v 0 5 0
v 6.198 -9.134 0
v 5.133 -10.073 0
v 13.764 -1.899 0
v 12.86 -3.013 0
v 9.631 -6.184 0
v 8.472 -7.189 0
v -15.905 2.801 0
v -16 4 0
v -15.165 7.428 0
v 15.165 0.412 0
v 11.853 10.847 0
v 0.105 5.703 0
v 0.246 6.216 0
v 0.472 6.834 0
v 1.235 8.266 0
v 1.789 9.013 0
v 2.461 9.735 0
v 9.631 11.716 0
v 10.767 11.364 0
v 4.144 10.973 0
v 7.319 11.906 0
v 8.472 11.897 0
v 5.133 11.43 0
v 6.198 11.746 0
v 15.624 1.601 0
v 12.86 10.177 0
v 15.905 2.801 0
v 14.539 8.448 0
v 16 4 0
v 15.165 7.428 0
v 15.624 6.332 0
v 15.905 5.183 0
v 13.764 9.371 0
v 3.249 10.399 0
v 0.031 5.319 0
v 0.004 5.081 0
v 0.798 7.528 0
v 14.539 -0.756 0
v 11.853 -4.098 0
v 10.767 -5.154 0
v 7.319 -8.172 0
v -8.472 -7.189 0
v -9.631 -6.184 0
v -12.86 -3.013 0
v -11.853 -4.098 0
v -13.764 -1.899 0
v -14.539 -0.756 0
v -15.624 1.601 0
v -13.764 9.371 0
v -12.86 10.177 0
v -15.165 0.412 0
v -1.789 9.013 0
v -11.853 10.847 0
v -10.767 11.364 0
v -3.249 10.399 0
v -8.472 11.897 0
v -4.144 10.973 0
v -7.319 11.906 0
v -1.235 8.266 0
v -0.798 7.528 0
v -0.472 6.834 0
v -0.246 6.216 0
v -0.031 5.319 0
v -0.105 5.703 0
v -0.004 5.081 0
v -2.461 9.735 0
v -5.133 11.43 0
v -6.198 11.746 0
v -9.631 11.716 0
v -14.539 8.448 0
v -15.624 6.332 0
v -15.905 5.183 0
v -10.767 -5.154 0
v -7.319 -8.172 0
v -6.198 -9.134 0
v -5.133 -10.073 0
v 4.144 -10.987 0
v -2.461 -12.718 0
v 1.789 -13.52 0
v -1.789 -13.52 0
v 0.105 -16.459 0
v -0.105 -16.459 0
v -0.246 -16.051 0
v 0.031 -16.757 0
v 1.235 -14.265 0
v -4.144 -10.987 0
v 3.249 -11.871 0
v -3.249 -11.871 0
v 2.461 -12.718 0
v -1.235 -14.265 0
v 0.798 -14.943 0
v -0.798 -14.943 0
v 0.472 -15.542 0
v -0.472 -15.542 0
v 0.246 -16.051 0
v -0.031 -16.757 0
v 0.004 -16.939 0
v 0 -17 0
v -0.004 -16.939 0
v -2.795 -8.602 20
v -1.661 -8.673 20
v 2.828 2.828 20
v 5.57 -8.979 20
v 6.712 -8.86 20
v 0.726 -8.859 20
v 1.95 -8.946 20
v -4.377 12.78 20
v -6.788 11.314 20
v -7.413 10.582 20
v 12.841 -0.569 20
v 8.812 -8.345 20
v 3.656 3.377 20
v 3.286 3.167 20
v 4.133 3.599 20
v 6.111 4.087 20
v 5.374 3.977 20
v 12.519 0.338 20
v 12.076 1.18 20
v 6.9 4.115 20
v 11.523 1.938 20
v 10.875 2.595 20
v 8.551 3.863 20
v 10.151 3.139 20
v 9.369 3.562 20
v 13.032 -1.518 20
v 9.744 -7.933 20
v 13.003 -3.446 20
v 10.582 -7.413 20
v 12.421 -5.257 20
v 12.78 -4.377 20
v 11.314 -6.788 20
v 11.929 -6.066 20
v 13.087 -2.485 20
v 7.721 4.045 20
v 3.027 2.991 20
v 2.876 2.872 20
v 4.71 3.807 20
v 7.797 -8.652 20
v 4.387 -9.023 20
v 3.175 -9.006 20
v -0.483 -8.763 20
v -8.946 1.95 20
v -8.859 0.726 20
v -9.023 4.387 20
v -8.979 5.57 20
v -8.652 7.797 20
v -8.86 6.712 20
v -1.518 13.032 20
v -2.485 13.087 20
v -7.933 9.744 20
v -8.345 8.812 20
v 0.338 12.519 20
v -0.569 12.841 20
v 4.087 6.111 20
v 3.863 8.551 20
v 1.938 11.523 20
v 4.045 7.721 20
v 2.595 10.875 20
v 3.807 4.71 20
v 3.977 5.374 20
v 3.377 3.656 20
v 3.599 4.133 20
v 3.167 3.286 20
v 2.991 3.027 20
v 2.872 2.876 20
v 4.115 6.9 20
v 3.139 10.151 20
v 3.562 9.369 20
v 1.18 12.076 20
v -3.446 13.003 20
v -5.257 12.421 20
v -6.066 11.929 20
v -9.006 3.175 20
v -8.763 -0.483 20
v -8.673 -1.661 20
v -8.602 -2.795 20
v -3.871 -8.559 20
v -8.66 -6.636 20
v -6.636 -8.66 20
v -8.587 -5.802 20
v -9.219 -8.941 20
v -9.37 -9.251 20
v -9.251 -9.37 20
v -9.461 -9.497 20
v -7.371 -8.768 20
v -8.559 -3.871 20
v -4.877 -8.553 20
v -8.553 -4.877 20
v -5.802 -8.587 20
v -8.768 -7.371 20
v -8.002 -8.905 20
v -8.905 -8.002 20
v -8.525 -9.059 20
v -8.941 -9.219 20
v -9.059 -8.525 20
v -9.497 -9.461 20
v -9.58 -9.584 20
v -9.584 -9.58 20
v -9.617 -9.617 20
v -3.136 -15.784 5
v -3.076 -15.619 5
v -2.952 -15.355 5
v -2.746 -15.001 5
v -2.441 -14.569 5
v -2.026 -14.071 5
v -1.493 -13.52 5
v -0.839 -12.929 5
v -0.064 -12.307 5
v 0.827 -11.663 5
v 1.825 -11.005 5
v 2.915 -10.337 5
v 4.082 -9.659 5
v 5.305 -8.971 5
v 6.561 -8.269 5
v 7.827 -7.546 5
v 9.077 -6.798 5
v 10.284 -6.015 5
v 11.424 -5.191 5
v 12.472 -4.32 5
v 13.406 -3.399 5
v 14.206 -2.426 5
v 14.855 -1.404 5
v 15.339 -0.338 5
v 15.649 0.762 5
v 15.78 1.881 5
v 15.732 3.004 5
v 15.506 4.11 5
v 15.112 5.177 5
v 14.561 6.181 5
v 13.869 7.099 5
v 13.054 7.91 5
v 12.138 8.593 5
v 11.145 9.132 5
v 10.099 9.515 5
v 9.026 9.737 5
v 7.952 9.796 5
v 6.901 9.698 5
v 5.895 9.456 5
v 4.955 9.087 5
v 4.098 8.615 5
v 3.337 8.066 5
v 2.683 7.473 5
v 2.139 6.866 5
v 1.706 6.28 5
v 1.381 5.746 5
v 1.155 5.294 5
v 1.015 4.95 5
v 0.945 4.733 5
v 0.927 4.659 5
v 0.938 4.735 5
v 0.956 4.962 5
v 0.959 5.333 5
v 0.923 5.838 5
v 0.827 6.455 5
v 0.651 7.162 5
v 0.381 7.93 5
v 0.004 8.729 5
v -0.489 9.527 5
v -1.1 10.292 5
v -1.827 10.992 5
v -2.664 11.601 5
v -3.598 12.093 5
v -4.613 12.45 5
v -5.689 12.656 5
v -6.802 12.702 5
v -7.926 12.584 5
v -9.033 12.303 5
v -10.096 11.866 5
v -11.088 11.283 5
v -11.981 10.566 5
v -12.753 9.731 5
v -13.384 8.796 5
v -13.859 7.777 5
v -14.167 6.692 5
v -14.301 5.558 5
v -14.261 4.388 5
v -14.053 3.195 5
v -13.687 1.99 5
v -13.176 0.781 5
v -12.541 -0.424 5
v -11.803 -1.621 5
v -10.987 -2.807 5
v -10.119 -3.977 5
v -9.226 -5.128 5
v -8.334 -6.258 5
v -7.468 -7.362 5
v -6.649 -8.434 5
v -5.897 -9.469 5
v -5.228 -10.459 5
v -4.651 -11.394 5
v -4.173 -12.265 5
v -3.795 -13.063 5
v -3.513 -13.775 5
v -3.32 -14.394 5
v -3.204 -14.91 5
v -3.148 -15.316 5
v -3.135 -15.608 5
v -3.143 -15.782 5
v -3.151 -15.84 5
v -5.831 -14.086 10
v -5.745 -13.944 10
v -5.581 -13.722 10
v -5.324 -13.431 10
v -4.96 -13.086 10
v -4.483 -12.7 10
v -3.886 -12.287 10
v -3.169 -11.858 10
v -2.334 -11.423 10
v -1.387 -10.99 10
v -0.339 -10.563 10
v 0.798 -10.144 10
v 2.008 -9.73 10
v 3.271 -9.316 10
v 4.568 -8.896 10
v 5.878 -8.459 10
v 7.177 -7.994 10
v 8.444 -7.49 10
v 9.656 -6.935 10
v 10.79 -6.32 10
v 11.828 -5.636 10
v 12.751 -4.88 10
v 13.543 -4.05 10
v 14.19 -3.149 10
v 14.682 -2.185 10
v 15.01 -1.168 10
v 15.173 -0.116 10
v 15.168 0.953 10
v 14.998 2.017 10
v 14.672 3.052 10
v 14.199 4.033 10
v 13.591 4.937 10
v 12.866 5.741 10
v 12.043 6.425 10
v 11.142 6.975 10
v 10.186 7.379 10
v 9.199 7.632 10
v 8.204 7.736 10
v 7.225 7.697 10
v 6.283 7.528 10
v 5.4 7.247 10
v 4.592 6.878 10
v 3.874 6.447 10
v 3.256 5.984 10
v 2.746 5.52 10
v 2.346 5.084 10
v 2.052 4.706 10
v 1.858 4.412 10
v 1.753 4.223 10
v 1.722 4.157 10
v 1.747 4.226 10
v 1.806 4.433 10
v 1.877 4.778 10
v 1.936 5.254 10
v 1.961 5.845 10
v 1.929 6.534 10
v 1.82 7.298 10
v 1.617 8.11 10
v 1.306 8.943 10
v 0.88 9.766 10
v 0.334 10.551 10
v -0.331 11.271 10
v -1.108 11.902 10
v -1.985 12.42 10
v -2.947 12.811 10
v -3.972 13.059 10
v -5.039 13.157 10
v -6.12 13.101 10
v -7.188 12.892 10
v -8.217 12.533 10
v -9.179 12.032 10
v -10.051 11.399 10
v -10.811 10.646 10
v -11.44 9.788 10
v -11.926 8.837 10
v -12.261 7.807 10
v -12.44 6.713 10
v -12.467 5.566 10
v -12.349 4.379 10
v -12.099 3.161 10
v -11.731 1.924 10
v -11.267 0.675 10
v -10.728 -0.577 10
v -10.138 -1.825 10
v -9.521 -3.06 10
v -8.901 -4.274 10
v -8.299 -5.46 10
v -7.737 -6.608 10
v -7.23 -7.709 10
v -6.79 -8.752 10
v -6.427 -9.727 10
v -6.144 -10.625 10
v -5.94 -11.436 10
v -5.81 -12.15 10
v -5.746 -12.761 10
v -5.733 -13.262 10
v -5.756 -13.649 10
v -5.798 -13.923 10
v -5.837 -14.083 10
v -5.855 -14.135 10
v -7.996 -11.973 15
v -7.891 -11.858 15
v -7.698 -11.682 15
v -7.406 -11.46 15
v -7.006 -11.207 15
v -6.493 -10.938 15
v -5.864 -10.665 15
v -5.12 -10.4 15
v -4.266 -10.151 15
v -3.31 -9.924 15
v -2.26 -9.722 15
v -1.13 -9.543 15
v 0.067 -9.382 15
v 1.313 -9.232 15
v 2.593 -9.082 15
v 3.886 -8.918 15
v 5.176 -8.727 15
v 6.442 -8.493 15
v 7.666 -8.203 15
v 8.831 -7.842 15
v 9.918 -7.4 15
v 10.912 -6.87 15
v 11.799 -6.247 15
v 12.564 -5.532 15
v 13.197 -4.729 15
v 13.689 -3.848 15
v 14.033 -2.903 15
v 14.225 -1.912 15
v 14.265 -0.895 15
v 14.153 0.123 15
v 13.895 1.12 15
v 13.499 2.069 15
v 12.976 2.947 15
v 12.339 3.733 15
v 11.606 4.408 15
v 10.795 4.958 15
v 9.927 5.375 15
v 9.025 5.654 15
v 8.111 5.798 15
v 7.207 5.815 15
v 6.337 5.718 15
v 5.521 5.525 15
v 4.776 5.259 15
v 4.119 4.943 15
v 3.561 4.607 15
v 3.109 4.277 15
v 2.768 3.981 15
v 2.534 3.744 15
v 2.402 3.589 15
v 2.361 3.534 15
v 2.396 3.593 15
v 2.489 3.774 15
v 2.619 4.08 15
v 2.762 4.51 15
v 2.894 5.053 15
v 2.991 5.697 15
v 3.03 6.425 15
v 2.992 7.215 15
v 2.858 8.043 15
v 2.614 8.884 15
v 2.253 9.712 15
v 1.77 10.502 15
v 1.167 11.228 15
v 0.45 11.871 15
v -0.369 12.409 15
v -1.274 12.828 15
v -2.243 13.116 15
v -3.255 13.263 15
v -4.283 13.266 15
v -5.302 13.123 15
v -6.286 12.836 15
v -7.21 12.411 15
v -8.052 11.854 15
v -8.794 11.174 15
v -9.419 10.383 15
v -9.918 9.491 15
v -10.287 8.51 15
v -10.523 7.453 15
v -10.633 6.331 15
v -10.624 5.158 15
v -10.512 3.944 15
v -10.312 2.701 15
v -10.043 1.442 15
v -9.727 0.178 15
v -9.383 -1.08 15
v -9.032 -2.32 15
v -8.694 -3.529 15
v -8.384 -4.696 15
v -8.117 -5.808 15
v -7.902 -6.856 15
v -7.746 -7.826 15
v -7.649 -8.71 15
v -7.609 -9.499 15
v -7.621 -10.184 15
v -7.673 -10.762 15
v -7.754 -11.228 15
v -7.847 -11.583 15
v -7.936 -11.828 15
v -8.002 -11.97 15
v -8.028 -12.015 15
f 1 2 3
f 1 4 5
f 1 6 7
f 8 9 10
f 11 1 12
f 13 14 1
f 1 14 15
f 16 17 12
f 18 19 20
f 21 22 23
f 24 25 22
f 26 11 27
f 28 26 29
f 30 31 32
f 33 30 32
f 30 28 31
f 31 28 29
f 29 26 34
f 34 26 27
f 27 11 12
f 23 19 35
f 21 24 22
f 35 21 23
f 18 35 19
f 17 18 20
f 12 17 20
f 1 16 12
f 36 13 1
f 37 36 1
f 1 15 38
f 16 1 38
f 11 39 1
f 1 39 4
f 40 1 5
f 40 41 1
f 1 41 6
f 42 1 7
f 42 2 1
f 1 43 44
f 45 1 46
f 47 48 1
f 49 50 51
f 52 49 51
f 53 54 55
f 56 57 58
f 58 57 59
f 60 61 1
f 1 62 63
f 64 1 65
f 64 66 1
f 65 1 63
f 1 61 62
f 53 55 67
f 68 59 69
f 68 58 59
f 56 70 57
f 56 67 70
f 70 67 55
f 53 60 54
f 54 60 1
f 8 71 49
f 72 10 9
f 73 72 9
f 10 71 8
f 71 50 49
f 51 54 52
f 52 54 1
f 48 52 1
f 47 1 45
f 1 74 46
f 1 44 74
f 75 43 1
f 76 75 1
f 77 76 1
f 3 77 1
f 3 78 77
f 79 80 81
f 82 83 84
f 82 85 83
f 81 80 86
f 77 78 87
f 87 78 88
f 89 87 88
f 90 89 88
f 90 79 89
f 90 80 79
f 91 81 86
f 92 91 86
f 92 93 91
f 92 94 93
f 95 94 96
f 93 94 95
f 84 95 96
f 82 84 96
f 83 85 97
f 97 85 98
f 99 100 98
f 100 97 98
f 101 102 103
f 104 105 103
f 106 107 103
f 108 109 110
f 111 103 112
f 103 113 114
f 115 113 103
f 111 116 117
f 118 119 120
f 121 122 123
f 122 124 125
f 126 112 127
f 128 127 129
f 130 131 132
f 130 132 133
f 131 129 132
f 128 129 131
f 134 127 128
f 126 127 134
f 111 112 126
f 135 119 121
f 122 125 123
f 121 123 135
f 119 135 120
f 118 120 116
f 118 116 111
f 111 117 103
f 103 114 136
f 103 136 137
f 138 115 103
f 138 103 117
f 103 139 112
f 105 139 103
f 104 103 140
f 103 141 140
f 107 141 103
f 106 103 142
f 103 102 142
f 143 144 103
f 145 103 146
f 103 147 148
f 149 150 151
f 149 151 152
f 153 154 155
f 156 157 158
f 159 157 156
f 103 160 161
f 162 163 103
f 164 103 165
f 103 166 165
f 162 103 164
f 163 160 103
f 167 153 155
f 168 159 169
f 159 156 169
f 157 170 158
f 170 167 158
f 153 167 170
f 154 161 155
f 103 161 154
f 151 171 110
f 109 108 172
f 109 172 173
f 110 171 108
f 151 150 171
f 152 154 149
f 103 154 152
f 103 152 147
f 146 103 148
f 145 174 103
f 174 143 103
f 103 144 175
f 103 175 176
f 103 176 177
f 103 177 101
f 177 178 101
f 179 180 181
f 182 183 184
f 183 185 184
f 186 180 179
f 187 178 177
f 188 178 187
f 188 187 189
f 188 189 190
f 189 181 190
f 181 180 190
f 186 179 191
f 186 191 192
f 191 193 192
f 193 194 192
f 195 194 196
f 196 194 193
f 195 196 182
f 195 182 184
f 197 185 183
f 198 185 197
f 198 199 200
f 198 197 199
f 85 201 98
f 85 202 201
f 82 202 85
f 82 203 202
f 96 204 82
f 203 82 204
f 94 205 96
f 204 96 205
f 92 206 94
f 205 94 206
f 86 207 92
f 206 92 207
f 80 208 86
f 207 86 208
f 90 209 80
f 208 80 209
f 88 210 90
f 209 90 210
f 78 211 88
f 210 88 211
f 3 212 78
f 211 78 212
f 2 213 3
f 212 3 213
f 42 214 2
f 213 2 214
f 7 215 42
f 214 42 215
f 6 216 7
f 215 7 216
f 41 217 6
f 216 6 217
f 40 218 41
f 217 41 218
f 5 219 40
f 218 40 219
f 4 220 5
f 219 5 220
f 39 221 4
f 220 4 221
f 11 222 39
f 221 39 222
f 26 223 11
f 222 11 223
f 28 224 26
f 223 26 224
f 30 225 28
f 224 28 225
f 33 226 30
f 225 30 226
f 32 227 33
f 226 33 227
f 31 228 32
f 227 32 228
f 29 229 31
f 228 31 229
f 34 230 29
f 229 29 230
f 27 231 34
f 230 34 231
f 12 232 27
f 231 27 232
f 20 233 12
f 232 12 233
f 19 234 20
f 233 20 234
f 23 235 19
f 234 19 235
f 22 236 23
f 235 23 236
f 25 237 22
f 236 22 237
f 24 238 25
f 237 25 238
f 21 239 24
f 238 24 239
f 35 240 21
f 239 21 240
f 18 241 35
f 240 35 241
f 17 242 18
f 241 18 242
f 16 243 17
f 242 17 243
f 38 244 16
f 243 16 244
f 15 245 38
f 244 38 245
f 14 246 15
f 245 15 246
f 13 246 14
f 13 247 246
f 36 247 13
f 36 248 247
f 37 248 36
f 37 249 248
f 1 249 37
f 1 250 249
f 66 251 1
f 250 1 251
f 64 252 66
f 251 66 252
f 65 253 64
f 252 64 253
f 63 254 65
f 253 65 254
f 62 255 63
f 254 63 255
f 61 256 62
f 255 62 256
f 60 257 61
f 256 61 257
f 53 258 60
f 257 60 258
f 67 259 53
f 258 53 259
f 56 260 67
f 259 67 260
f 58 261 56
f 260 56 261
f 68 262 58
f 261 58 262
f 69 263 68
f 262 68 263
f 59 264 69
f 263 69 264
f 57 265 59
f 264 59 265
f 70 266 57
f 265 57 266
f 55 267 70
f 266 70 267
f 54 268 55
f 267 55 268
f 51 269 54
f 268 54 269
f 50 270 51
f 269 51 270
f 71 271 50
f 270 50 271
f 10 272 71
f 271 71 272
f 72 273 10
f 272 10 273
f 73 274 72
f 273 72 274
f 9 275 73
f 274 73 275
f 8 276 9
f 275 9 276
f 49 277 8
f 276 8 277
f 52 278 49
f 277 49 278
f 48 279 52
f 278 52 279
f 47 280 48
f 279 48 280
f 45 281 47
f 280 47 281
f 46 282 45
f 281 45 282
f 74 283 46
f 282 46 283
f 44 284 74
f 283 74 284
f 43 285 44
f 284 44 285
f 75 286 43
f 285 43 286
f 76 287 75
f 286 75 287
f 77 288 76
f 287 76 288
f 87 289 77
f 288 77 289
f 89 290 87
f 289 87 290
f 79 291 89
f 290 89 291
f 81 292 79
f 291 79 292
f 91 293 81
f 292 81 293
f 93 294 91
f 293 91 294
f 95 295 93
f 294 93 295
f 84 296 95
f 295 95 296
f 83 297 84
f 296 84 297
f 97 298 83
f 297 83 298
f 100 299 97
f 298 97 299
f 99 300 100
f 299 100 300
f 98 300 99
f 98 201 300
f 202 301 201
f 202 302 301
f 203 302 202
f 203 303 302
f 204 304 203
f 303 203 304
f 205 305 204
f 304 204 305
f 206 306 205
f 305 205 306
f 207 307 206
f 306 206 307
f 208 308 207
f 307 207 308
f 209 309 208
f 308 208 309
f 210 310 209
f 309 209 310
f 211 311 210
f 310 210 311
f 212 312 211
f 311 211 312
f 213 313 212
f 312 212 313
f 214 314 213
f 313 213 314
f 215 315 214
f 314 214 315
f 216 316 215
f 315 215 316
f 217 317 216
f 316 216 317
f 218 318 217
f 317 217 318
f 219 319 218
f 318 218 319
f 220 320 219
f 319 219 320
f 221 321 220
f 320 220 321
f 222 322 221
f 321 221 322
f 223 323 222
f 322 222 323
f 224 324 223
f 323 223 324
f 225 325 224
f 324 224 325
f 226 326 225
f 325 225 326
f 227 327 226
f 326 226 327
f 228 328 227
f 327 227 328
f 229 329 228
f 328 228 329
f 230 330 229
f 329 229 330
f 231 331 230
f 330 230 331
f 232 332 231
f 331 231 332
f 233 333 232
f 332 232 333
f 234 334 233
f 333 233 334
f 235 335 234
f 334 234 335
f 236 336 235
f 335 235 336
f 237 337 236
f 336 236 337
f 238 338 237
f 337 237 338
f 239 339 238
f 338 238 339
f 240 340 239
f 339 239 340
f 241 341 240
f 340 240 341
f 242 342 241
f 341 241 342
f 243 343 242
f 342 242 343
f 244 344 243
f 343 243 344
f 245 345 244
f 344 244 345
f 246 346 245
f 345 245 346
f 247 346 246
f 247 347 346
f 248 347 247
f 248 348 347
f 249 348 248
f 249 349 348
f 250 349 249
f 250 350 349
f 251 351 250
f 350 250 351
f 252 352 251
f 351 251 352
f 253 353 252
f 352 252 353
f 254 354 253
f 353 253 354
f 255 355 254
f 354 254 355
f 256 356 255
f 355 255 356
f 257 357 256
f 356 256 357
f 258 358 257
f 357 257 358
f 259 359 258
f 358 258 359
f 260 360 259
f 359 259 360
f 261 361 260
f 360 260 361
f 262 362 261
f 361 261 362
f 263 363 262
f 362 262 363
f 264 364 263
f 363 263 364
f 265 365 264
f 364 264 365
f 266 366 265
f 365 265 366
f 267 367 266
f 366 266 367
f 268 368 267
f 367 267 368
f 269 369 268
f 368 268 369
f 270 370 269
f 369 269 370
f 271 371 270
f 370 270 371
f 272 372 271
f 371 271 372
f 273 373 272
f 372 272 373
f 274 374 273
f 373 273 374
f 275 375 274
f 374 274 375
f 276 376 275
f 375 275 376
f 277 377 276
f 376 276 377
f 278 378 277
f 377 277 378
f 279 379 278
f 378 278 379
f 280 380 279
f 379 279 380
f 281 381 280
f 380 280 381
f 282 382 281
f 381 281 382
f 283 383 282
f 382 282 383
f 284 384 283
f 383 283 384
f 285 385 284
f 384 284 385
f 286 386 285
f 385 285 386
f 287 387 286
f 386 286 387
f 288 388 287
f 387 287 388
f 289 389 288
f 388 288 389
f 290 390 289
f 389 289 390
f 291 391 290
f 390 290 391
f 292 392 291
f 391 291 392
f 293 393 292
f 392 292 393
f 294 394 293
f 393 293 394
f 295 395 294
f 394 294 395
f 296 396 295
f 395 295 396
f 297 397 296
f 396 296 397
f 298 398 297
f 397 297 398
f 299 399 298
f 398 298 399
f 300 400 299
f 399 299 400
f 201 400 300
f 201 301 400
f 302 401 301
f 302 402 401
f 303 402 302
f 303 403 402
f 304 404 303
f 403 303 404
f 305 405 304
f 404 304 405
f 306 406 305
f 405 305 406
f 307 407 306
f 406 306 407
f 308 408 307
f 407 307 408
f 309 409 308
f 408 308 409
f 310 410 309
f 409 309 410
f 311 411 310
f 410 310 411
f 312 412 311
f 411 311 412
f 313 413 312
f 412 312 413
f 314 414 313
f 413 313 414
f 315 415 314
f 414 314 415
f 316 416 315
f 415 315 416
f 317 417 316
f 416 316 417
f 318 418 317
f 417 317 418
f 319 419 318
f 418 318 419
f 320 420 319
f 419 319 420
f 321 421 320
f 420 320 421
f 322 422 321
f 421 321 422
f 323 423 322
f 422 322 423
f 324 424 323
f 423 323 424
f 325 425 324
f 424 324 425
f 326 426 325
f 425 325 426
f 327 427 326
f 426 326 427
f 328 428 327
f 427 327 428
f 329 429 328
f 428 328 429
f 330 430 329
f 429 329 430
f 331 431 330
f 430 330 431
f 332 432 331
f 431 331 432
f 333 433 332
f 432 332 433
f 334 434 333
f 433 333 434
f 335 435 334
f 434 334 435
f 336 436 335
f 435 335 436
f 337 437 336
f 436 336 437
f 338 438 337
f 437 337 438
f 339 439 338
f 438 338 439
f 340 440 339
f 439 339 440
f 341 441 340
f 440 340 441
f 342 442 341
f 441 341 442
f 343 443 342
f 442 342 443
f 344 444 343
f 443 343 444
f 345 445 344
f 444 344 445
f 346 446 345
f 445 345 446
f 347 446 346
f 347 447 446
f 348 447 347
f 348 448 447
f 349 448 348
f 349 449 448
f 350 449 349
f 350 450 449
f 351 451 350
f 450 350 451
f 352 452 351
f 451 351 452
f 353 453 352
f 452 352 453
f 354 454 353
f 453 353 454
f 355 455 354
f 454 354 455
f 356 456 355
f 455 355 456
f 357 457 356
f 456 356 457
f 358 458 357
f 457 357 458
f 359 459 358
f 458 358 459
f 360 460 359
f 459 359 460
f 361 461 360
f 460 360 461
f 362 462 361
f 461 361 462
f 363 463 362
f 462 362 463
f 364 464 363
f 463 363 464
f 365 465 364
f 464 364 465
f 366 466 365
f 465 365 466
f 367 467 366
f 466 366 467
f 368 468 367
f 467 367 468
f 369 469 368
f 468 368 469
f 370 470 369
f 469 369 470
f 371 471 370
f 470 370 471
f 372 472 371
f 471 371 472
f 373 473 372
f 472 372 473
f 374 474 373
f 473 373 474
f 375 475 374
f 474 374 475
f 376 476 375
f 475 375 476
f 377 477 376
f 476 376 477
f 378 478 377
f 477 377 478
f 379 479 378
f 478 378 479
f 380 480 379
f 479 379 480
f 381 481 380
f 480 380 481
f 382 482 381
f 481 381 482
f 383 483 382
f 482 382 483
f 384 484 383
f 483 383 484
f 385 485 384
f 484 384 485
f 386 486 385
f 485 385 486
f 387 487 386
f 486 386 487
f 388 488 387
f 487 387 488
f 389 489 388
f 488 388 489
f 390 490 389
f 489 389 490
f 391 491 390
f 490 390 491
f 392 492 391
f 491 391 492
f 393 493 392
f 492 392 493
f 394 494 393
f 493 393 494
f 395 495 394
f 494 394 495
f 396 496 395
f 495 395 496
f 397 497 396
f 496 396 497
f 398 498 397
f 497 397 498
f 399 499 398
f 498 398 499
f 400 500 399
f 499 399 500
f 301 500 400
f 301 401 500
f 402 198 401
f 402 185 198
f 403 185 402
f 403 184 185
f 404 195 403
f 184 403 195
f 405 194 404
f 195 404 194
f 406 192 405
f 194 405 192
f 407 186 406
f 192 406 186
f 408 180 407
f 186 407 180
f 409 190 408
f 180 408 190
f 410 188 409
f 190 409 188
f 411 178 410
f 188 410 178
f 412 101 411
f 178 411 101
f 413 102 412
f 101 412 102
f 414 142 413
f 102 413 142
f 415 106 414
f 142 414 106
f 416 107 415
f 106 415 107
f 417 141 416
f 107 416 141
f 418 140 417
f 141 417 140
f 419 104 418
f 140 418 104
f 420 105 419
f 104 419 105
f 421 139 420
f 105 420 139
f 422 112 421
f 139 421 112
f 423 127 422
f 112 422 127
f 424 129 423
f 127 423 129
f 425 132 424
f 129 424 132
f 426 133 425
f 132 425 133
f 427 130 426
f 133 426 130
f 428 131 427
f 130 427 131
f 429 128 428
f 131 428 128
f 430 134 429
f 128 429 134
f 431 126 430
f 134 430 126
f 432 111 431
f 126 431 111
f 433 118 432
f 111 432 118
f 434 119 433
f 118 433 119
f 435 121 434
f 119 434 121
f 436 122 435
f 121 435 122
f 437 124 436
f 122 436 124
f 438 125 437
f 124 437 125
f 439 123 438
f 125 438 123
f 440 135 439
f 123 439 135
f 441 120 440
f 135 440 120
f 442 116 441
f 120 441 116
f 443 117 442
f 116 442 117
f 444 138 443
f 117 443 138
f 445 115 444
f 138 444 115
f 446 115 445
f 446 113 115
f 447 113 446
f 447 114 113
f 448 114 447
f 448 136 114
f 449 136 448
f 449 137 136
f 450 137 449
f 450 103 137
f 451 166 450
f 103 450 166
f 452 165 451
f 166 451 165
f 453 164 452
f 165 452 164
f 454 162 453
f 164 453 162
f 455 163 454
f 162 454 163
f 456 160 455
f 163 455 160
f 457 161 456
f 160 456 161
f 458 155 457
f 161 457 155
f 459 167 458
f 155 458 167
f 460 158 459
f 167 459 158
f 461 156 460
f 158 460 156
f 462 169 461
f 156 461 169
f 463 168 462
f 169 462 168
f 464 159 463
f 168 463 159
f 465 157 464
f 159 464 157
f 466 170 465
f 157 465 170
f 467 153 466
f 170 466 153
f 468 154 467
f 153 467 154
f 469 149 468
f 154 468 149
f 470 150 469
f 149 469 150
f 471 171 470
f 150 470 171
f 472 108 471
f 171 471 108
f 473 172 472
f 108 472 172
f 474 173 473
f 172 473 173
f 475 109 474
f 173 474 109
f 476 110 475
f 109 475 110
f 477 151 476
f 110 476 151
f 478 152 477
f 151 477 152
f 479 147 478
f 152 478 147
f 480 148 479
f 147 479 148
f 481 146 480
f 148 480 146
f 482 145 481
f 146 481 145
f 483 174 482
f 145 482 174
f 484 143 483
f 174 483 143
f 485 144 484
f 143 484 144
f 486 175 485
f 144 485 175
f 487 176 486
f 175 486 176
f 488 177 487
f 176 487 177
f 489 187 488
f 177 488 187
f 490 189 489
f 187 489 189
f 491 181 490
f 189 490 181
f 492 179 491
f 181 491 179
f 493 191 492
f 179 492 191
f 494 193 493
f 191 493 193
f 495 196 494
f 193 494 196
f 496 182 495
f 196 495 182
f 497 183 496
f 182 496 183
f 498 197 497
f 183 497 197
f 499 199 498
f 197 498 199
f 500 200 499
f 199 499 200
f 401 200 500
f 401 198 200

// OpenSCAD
// Heart

// x: 16 * pow(sin(t), 3)
// y: 13 * cos(t) - 5 * cos(2*t) - 2 * cos(3*t) - cos(4*t)

n = 100;
step = 360/n;
h = 20;
points = [ for (t=[0:step:359.999]) [16 * pow(sin(t), 3), 13 * cos(t) - 5 * cos(2*t) - 2 * cos(3*t) - cos(4*t)]];
    
linear_extrude(height=h, twist=45, scale = 0.8)
    polygon(points);
